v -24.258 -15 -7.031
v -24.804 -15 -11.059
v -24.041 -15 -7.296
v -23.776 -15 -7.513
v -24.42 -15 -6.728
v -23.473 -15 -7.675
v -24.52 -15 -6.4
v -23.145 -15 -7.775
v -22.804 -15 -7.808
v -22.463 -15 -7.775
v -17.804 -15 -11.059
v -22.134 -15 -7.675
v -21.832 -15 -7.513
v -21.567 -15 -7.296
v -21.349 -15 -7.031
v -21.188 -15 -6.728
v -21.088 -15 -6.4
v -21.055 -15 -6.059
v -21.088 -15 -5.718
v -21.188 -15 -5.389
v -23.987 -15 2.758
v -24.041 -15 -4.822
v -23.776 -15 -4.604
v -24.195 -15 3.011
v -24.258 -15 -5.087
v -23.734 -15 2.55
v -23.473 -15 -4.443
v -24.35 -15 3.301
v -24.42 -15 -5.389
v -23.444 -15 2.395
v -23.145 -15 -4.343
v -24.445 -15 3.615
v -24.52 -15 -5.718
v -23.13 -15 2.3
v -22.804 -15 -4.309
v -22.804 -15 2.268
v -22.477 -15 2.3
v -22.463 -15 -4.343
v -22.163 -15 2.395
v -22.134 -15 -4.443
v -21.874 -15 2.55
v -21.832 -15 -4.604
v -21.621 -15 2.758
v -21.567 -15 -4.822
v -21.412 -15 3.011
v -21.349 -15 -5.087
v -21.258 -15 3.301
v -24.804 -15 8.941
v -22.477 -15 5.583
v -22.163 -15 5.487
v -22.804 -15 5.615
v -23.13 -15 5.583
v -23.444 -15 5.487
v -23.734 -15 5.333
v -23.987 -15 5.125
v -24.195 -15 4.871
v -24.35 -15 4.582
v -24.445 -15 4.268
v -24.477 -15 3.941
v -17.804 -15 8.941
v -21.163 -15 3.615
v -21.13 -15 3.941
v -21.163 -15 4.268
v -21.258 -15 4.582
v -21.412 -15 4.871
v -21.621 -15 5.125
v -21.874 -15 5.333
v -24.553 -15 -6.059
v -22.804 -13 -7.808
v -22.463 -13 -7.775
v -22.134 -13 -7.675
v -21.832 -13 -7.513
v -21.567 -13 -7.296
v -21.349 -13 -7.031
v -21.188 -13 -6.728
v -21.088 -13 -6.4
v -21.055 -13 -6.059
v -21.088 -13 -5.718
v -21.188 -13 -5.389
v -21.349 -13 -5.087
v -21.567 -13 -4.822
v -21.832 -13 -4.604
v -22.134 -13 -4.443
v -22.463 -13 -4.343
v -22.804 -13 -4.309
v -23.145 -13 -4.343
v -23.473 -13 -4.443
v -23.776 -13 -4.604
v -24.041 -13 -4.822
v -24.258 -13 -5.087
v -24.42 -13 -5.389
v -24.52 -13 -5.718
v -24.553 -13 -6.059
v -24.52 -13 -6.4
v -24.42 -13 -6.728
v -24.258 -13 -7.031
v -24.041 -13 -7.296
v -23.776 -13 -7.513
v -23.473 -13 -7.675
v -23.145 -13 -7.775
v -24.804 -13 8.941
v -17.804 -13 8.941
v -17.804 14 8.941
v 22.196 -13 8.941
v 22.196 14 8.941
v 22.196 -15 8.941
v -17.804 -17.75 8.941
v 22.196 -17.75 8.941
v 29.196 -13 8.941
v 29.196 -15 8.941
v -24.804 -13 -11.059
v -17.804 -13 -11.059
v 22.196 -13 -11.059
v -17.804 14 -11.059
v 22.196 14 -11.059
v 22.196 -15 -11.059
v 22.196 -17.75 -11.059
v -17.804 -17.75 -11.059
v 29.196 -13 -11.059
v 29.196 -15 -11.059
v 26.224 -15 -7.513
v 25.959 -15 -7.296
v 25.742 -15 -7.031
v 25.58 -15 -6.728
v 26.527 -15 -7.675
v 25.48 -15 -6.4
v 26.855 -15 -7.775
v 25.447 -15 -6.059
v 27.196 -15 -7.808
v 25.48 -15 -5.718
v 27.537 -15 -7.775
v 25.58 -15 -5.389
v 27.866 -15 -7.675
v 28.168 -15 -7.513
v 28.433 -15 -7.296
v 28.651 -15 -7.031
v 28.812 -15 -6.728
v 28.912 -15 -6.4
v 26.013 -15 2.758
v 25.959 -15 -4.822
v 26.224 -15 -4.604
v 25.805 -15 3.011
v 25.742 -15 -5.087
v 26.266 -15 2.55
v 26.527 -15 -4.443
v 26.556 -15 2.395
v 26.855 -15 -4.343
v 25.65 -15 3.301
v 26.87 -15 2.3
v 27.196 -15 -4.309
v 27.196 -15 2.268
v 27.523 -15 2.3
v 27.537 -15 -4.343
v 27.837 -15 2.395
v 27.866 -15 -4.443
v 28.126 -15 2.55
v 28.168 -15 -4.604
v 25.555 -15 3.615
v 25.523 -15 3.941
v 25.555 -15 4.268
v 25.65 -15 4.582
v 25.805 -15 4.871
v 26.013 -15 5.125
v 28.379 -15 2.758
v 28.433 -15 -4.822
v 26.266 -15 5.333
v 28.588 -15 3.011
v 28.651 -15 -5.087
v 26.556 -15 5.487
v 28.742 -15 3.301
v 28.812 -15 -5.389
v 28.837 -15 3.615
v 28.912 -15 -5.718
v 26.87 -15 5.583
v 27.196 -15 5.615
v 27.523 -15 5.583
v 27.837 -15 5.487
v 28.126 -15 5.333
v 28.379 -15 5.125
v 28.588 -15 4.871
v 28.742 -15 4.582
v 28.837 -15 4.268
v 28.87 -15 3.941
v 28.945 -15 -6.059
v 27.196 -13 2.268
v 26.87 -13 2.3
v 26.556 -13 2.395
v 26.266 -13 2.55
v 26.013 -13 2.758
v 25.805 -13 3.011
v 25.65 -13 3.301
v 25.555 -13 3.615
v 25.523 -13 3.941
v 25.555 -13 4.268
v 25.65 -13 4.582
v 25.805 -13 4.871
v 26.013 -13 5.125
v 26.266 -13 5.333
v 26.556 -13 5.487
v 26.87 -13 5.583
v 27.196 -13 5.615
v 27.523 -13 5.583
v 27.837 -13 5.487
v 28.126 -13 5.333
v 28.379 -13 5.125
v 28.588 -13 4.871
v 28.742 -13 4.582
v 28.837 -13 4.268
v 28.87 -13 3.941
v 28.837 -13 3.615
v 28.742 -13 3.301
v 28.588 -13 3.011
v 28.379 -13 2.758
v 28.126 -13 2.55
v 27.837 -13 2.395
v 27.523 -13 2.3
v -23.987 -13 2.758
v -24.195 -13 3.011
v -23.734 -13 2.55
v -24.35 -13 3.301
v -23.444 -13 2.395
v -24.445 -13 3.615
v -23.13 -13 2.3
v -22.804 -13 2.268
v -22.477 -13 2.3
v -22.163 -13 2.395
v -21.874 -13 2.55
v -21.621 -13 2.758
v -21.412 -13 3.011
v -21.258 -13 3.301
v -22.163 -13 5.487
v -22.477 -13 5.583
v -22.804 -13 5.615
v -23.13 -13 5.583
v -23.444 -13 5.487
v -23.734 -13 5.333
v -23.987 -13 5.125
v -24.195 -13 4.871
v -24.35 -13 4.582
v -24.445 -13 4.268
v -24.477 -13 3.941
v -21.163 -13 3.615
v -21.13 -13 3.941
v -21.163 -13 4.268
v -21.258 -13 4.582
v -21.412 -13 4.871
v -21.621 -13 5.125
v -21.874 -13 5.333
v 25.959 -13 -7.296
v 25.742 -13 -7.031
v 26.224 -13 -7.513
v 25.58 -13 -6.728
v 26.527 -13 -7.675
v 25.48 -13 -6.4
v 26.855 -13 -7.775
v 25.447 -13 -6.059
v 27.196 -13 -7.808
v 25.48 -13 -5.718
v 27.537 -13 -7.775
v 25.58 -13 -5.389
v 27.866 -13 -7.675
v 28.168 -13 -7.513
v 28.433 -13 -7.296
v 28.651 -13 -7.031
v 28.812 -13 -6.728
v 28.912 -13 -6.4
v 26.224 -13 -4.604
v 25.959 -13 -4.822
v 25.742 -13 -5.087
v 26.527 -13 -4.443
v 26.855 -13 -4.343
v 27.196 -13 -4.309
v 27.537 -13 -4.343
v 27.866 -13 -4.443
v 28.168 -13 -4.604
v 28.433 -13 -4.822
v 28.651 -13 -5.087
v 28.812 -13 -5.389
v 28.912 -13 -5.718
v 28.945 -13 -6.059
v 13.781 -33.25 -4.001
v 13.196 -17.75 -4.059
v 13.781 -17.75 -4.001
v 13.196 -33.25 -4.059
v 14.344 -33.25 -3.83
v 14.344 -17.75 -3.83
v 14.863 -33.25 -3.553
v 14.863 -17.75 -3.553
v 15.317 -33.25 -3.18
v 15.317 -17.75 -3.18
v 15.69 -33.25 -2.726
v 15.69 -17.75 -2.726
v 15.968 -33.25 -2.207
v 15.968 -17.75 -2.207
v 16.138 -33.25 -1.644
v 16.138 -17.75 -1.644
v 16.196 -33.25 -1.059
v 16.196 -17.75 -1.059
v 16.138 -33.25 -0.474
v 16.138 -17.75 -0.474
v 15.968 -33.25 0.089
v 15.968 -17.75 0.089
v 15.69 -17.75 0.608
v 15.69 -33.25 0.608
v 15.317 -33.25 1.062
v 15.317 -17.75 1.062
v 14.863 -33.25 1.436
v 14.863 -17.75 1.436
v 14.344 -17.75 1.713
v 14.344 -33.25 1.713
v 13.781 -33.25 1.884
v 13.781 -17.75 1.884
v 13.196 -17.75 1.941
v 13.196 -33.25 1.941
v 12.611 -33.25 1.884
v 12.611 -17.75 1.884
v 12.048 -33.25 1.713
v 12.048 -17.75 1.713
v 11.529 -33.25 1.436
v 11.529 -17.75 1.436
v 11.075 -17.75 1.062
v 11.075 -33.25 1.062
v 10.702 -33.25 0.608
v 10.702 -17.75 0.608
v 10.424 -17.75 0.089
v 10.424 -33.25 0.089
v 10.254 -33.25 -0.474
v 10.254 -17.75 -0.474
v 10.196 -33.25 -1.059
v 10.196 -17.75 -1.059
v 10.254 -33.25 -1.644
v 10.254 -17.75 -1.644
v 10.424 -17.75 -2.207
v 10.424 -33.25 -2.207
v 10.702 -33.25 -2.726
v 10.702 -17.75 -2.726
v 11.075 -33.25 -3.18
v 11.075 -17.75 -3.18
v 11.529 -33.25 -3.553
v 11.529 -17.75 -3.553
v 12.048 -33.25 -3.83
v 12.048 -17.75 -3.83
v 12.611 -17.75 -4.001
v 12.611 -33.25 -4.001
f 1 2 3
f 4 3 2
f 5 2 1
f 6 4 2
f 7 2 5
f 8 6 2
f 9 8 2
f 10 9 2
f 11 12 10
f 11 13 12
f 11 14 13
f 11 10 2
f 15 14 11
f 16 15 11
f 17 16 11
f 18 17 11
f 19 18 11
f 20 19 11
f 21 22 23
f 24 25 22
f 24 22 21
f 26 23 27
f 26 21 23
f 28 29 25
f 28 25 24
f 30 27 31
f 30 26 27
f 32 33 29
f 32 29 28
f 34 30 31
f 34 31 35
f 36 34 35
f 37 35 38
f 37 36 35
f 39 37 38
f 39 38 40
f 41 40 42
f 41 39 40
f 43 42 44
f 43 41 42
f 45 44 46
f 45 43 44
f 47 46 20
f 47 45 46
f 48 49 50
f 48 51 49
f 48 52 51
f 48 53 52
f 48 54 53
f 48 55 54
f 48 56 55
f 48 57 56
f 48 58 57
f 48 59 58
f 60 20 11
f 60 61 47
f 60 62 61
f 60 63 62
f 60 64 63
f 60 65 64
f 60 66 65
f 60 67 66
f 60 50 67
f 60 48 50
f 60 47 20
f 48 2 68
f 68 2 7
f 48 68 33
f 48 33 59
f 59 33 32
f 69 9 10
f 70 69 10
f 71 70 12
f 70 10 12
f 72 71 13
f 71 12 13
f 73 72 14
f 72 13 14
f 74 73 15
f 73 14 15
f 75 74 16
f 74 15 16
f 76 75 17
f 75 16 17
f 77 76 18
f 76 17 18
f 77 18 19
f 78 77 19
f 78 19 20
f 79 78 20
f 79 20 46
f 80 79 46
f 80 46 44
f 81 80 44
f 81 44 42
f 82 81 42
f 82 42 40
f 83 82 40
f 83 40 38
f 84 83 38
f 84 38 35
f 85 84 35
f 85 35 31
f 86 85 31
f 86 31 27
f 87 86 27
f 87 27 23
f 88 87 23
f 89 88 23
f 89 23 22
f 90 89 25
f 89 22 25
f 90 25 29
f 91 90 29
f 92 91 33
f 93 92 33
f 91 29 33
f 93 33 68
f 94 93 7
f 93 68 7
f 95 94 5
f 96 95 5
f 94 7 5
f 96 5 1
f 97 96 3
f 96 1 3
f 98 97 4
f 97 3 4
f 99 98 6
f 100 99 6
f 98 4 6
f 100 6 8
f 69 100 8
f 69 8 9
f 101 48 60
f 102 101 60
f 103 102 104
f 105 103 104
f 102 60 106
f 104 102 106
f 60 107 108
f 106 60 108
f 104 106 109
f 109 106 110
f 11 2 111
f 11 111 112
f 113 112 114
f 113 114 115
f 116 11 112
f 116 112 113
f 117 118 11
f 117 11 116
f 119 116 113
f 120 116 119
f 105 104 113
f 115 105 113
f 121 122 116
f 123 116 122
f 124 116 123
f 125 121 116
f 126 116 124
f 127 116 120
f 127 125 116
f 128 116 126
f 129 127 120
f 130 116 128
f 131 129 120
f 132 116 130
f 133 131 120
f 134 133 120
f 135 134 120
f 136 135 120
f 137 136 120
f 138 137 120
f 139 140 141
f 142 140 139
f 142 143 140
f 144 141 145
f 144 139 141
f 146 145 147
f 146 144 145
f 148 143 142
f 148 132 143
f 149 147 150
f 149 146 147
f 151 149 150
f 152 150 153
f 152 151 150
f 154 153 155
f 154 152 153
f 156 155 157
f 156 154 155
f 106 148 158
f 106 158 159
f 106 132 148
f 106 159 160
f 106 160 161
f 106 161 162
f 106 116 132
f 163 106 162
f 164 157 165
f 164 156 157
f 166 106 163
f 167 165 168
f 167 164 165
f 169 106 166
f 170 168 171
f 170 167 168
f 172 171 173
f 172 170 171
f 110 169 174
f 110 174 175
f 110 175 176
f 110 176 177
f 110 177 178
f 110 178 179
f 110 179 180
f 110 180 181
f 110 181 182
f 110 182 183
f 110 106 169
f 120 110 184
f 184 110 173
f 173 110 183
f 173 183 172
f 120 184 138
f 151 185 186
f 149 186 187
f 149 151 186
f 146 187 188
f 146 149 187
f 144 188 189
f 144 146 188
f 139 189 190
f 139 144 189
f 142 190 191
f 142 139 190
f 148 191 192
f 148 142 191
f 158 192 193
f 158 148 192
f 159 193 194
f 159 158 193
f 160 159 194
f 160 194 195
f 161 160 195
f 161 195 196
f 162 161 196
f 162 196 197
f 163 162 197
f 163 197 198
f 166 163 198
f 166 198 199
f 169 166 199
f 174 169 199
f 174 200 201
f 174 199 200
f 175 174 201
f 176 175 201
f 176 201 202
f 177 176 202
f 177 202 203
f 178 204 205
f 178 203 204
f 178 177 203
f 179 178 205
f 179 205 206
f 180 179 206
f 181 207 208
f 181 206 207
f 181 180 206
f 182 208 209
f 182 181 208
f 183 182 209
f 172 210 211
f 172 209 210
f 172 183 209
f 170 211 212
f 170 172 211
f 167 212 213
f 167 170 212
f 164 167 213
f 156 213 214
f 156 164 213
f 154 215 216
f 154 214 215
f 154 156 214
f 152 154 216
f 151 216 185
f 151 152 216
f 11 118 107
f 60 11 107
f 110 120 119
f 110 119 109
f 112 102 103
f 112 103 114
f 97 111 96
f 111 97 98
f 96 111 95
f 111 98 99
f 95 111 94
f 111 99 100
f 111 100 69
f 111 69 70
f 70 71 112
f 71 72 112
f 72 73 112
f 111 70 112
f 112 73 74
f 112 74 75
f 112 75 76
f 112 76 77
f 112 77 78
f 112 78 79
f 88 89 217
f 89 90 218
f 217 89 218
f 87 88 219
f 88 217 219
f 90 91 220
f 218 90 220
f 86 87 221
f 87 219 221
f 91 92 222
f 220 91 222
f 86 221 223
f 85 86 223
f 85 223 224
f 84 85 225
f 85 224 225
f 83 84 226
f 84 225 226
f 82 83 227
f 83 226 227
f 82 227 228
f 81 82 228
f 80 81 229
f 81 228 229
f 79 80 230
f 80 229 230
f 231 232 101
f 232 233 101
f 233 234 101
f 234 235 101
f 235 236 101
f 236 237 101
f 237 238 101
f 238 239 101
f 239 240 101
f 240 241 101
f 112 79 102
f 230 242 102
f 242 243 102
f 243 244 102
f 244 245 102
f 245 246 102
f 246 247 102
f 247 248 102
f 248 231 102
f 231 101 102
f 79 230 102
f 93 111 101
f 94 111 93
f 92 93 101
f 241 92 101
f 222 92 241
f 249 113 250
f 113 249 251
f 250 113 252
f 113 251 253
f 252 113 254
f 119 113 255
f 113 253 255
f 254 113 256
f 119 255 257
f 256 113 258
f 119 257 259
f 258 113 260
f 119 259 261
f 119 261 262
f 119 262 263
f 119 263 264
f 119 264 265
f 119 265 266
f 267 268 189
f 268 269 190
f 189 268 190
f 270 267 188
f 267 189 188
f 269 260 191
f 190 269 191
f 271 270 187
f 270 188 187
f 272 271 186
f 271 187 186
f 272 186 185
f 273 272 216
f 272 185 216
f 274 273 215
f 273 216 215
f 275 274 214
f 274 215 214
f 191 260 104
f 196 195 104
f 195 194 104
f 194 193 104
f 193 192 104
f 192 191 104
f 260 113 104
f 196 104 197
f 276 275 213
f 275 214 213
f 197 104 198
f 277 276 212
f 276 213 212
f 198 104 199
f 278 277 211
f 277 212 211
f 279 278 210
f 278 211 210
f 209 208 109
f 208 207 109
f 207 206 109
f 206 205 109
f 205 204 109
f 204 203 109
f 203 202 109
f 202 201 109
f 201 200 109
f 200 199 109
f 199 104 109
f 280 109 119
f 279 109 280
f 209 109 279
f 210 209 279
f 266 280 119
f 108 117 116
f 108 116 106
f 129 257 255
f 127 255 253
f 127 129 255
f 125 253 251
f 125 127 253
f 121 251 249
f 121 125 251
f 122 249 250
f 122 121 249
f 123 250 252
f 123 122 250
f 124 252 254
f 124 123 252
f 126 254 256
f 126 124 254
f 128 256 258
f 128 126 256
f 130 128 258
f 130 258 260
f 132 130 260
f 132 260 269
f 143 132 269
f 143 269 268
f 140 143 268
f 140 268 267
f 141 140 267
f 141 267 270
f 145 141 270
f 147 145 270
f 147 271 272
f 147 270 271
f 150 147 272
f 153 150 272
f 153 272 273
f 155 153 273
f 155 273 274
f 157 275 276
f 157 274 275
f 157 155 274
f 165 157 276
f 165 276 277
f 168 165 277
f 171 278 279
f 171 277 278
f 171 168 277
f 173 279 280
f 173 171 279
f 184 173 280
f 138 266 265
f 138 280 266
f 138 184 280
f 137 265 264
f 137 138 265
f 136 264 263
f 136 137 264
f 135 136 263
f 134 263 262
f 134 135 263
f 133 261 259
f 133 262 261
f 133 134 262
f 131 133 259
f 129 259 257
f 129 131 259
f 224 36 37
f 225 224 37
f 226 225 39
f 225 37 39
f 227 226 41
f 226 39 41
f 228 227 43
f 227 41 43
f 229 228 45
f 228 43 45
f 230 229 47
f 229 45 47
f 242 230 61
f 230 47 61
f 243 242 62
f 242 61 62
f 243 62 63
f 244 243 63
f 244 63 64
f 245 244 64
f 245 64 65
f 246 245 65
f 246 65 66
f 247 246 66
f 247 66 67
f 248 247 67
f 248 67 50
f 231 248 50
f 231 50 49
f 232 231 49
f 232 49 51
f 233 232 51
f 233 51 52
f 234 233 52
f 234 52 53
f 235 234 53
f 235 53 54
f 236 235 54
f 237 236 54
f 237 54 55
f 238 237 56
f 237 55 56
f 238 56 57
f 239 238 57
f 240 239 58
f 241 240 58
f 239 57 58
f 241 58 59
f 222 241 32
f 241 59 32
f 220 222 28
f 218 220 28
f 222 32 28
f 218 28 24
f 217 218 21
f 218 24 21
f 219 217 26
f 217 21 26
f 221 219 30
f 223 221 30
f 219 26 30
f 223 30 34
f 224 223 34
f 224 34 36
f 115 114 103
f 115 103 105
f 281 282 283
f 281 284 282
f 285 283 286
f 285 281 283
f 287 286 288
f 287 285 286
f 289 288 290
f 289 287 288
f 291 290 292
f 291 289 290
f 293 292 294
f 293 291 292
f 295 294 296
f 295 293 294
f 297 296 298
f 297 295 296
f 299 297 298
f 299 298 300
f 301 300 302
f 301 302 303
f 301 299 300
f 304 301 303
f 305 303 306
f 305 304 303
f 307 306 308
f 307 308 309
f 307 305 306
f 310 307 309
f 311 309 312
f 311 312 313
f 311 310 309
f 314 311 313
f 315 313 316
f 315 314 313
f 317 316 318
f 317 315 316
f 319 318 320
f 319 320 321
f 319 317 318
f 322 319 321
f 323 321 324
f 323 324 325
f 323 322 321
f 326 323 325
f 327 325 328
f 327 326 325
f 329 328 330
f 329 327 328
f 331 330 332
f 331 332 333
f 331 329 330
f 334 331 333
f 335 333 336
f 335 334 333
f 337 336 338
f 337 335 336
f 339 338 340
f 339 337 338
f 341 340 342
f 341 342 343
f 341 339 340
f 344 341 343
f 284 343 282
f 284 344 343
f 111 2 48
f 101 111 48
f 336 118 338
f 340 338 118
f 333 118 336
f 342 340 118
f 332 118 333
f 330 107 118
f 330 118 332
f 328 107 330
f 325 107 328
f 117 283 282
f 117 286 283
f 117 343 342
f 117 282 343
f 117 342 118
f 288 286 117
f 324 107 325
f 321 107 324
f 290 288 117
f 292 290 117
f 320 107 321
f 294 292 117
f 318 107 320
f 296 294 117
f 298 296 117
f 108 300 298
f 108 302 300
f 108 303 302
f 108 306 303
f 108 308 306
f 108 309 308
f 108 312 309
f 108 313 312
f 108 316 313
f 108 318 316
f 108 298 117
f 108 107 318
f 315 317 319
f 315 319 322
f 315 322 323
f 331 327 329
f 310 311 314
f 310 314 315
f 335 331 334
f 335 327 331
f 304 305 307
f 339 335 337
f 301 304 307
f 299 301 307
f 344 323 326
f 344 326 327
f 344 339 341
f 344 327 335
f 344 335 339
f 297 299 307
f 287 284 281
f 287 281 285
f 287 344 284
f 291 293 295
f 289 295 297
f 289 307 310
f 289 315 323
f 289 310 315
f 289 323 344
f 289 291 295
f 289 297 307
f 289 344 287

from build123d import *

# Parameters (mm, degrees)
SKETCH1_W           = 40
SKETCH1_H           = 20
BOSS_EXTRUDE1_DEPTH = 14
SKETCH2_W           = 54
SKETCH2_H           = 20
BOSS_EXTRUDE2_DEPTH = 1
SKETCH3_W           = 40
SKETCH3_H           = 20
BOSS_EXTRUDE3_DEPTH = 2.75
SKETCH4_R           = 3
BOSS_EXTRUDE4_DEPTH = 15.5
SKETCH5_R           = 1.673571511
SKETCH5_R_2         = 1.749374088
CUT_EXTRUDE3_DEPTH  = 9.5


with BuildPart() as part:
    # Sketch1 → Boss-Extrude1 (new, symmetric)
    with BuildSketch(Plane(origin=(0, 0, 0), x_dir=(1, 0, 0), z_dir=(0, 1, 0))):
        with Locations((2.196078431, 1.058823529)):
            Rectangle(SKETCH1_W, SKETCH1_H)
    extrude(amount=BOSS_EXTRUDE1_DEPTH, both=True)

    # Sketch2 → Boss-Extrude2 (add, symmetric)
    with BuildSketch(Plane.XZ.offset(14)):
        with Locations((2.196078431, -1.058823529)):
            Rectangle(SKETCH2_W, SKETCH2_H)
    extrude(amount=BOSS_EXTRUDE2_DEPTH, both=True)

    # Sketch3 → Boss-Extrude3 (add, symmetric)
    with BuildSketch(Plane.XZ.offset(15)):
        with Locations((2.196078431, -1.058823529)):
            Rectangle(SKETCH3_W, SKETCH3_H)
    extrude(amount=BOSS_EXTRUDE3_DEPTH, both=True)

    # Sketch4 → Boss-Extrude4 (add, symmetric)
    with BuildSketch(Plane.XZ.offset(17.75)):
        with Locations(Location((13.196078431, -1.058823529, 0), (0, 0, 270))):
            Circle(SKETCH4_R)
    extrude(amount=BOSS_EXTRUDE4_DEPTH, both=True)

    # Sketch5 → Cut-Extrude3 (cut)
    with BuildSketch(Plane.XZ.offset(15)):
        with Locations(Location((-22.803921569, 3.941176471, 0), (0, 0, 270))):
            Circle(SKETCH5_R)
        with Locations(Location((-22.803921569, -6.058823529, 0), (0, 0, 270))):
            Circle(SKETCH5_R_2)
    cut_extrude3 = extrude(amount=-CUT_EXTRUDE3_DEPTH, mode=Mode.SUBTRACT)

    # Mirror1: Cut-Extrude3 across plane
    add(cut_extrude3.mirror(Plane.ZY.offset(-2.196078431)), mode=Mode.SUBTRACT)


solid = part.part
